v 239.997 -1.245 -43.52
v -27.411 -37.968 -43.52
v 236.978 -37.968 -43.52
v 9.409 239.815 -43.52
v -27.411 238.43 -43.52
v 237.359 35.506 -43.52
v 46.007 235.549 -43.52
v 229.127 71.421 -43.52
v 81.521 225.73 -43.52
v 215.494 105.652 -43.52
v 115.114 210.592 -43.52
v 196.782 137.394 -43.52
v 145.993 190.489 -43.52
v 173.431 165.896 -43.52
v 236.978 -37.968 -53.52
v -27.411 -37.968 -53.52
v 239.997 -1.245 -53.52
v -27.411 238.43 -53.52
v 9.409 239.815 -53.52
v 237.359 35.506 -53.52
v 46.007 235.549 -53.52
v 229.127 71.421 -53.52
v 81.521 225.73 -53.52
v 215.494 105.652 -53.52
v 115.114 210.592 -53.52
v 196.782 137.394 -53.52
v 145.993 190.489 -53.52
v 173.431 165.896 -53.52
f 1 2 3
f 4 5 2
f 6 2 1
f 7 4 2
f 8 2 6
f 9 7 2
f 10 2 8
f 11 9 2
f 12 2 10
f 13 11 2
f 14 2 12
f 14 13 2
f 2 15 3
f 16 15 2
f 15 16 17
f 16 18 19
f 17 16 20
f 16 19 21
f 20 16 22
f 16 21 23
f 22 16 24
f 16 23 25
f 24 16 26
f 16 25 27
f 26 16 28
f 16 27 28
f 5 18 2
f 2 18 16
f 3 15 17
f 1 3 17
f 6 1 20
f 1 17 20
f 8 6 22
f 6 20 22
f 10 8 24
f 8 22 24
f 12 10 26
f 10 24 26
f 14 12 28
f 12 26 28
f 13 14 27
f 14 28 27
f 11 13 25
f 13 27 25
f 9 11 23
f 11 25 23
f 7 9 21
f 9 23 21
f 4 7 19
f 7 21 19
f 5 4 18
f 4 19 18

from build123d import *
from build123d.topology import SkipClean

# Parameters (mm, degrees)
SKETCH1_R           = 240
BOSS_EXTRUDE1_DEPTH = 10
BOSS_EXTRUDE2_START = 102.52
SKETCH2_R           = 240
SKETCH2_R_2         = 230
BOSS_EXTRUDE2_DEPTH = 102.52
CUT_EXTRUDE1_START  = -112.52
CUT_EXTRUDE1_DEPTH  = 112.52
BOSS_EXTRUDE4_START = 6
BOSS_EXTRUDE4_DEPTH = 6
CUT_EXTRUDE2_DEPTH  = 348.598906788
BOSS_EXTRUDE6_START = 10
BOSS_EXTRUDE6_DEPTH = 10
CUT_EXTRUDE3_START  = -118.52
CUT_EXTRUDE3_DEPTH  = 118.52


# Read off the part's stored shape, not the designer's step: Cut-Extrude1
with BuildPart() as part:
    # Sketch1 → Boss-Extrude1 (new body)
    with BuildSketch(Plane.XY.offset(65)):
        Circle(SKETCH1_R)
    extrude(amount=BOSS_EXTRUDE1_DEPTH)

    # Sketch2 → Boss-Extrude2 (add)
    with BuildSketch(Plane(origin=(0, 0, 65), x_dir=(-1, 0, 0), z_dir=(0, 0, -1)).offset(BOSS_EXTRUDE2_START)):
        Circle(SKETCH2_R)
        Circle(SKETCH2_R_2, mode=Mode.SUBTRACT)
    extrude(amount=-BOSS_EXTRUDE2_DEPTH)

    # Cut-Extrude1 outline → Cut-Extrude1 (cut)
    with BuildSketch(Plane(origin=(0, 0, -37.52), x_dir=(-1, 0, 0), z_dir=(0, 0, -1)).offset(CUT_EXTRUDE1_START)):
        with BuildLine():
            ThreePointArc((-87.384683401, -223.526099386), (232.916203487, -57.879548662), (27.411033925, 238.429518347))
            Line((27.411033925, 238.429518347), (27.411033925, -223.526099386))
            Line((27.411033925, -223.526099386), (-87.384683401, -223.526099386))
        make_face()
    extrude(amount=CUT_EXTRUDE1_DEPTH, mode=Mode.SUBTRACT)

    # Sketch5 → Boss-Extrude4 (add)
    with SkipClean():  # the faces are left unmerged after this step: merging them gives an invalid solid
        with BuildSketch(Plane(origin=(0, 0, -37.52), x_dir=(-1, 0, 0), z_dir=(0, 0, -1)).offset(BOSS_EXTRUDE4_START)):
            with BuildLine():
                Line((27.411033925, 228.360756741), (27.411033925, 238.429518347))
                ThreePointArc((27.411033925, 238.429518347), (-173.515297538, 165.808448277), (-236.939158864, -38.207787126))
                Line((-236.939158864, -38.207787126), (-226.804243794, -38.207787126))
                ThreePointArc((-226.804243794, -38.207787126), (-166.445517153, 158.732132285), (27.411033925, 228.360756741))
            make_face()
        extrude(amount=-BOSS_EXTRUDE4_DEPTH)

    # Sketch7 → Cut-Extrude2 (cut, through all)
    with SkipClean():  # the faces are left unmerged after this step: merging them gives an invalid solid
        with BuildSketch(Plane(origin=(0, 0, 0), x_dir=(0, 0, -1), z_dir=(1, 0, 0))):
            Polygon((-26.398, -50.207787126), (37.52, -50.207787126), (43.52, -50.207787126), (43.52, -37.967787126), (-27.418, -37.967787126), (-27.418, -49.187787126), (-27.418, -50.207787126), align=None)
        extrude(amount=CUT_EXTRUDE2_DEPTH, mode=Mode.SUBTRACT)

    # Sketch9 → Boss-Extrude6 (add)
    with SkipClean():  # the faces are left unmerged after this step: merging them gives an invalid solid
        with BuildSketch(Plane(origin=(0, 0, -43.52), x_dir=(-1, 0, 0), z_dir=(0, 0, -1)).offset(BOSS_EXTRUDE6_START)):
            with BuildLine():
                Line((-226.844543996, -37.967787126), (-236.977735538, -37.967787126))
                ThreePointArc((-236.977735538, -37.967787126), (-173.431306933, 165.896298258), (27.411033925, 238.429518347))
                Line((27.411033925, 238.429518347), (27.411033925, -37.967787126))
                Line((27.411033925, -37.967787126), (-226.844543996, -37.967787126))
            make_face()
        extrude(amount=-BOSS_EXTRUDE6_DEPTH)

    # Sketch10 → Cut-Extrude3 (cut)
    with BuildSketch(Plane.XY.offset(75).offset(CUT_EXTRUDE3_START)):
        with BuildLine():
            Line((-27.411033925, 238.429518347), (-27.411033925, -223.526099386))
            Line((-27.411033925, -223.526099386), (87.384683401, -223.526099386))
            ThreePointArc((87.384683401, -223.526099386), (232.916203487, 57.879548662), (-27.411033925, 238.429518347))
        make_face()
    extrude(amount=CUT_EXTRUDE3_DEPTH, mode=Mode.SUBTRACT)


solid = part.part
